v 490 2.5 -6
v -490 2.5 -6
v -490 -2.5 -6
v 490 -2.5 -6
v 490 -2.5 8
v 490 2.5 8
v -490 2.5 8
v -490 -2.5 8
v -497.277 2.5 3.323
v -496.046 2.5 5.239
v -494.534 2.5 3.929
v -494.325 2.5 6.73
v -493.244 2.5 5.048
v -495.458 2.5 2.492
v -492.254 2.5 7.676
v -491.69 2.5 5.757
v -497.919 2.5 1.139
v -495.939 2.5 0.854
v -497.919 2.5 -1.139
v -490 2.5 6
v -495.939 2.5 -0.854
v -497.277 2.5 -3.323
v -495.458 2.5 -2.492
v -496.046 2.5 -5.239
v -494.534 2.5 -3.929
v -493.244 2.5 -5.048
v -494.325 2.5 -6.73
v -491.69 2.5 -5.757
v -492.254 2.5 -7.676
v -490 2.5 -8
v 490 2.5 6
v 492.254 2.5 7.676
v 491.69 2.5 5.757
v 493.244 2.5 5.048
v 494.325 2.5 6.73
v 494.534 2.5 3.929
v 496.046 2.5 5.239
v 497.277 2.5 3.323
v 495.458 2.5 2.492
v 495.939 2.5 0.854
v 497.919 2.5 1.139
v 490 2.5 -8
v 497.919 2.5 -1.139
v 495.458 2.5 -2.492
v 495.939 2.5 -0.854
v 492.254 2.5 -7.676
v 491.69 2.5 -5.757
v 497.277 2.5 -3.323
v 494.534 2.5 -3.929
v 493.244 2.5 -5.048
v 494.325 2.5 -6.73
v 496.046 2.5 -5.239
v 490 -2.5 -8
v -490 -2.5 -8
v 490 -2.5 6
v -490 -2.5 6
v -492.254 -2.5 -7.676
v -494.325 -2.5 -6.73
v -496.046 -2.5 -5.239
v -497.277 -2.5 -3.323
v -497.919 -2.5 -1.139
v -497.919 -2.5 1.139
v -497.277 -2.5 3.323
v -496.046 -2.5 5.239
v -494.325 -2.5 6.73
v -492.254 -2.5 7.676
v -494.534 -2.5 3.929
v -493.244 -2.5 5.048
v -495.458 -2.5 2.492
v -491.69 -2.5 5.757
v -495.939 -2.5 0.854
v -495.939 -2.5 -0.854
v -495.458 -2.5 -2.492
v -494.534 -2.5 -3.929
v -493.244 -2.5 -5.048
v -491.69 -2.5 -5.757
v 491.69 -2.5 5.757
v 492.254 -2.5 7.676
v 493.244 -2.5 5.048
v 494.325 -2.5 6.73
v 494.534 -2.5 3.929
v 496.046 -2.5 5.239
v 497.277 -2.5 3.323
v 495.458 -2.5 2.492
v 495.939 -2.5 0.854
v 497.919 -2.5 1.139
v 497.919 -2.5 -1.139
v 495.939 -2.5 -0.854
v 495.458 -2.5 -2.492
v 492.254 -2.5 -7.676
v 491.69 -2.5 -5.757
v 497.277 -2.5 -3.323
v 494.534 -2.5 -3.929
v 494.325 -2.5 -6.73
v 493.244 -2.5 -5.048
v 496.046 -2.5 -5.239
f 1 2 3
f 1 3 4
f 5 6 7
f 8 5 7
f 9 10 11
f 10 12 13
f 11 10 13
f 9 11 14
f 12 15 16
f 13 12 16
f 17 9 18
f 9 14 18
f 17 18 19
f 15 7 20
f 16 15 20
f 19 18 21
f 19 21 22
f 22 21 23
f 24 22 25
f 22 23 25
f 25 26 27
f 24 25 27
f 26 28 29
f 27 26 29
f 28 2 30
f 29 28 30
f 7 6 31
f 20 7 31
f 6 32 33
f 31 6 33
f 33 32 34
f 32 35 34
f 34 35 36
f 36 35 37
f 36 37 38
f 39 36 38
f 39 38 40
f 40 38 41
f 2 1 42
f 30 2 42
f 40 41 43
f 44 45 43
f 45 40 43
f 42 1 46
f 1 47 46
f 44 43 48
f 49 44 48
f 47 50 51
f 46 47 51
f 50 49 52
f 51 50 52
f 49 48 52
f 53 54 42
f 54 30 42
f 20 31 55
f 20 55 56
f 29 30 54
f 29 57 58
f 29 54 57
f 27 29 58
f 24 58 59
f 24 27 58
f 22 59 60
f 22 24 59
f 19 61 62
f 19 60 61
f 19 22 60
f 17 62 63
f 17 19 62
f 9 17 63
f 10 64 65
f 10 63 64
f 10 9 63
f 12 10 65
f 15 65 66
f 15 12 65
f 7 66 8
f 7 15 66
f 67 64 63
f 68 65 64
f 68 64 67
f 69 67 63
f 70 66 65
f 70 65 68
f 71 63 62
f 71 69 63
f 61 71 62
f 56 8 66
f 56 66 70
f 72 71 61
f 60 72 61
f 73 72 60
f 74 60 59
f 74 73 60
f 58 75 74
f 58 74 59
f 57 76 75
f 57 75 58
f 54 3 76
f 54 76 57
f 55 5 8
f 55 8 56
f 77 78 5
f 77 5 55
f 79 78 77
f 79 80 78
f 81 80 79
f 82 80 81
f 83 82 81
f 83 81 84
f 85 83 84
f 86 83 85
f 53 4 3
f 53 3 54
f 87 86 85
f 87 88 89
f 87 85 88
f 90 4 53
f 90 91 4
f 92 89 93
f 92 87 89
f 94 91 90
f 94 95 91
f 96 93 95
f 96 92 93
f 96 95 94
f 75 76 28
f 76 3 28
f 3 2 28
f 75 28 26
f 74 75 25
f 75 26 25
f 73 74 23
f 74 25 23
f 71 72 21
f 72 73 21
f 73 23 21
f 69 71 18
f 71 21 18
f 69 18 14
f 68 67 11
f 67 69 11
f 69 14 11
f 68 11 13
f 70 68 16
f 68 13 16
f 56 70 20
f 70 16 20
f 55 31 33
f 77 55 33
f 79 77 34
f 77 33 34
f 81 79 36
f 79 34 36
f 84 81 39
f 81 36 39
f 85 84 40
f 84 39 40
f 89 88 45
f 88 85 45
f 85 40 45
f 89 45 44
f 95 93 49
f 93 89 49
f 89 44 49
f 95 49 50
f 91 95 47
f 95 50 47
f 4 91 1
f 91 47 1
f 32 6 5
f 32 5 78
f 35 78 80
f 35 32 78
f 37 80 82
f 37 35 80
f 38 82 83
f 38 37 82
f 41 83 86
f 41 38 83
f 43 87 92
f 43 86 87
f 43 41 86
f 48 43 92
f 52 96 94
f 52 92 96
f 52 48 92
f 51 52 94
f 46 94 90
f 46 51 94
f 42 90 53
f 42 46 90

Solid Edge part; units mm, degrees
sketch "Sketch1" plane through (0, 0, 0) normal (0, -1, 0) x (1, 0, 0)
  arc A0 (490, -8) -> (490, 8) centre (490, 0) ccw
  line L0 (490, 8) -> (-490, 8)
  arc A1 (-490, 8) -> (-490, -8) centre (-490, 0) ccw
  line L1 (-490, -8) -> (490, -8)
  line L2 (-490, -6) -> (490, -6)
  arc A2 (-490, 6) -> (-490, -6) centre (-490, 0) ccw
  line L3 (490, 6) -> (-490, 6)
  arc A3 (490, -6) -> (490, 6) centre (490, 0) ccw
  dimension "D1" = 980
  dimension "D2" = 6
  dimension "D3" = 2
extrude "Protrusion1" add sketch "Sketch1" along normal mid plane 5
